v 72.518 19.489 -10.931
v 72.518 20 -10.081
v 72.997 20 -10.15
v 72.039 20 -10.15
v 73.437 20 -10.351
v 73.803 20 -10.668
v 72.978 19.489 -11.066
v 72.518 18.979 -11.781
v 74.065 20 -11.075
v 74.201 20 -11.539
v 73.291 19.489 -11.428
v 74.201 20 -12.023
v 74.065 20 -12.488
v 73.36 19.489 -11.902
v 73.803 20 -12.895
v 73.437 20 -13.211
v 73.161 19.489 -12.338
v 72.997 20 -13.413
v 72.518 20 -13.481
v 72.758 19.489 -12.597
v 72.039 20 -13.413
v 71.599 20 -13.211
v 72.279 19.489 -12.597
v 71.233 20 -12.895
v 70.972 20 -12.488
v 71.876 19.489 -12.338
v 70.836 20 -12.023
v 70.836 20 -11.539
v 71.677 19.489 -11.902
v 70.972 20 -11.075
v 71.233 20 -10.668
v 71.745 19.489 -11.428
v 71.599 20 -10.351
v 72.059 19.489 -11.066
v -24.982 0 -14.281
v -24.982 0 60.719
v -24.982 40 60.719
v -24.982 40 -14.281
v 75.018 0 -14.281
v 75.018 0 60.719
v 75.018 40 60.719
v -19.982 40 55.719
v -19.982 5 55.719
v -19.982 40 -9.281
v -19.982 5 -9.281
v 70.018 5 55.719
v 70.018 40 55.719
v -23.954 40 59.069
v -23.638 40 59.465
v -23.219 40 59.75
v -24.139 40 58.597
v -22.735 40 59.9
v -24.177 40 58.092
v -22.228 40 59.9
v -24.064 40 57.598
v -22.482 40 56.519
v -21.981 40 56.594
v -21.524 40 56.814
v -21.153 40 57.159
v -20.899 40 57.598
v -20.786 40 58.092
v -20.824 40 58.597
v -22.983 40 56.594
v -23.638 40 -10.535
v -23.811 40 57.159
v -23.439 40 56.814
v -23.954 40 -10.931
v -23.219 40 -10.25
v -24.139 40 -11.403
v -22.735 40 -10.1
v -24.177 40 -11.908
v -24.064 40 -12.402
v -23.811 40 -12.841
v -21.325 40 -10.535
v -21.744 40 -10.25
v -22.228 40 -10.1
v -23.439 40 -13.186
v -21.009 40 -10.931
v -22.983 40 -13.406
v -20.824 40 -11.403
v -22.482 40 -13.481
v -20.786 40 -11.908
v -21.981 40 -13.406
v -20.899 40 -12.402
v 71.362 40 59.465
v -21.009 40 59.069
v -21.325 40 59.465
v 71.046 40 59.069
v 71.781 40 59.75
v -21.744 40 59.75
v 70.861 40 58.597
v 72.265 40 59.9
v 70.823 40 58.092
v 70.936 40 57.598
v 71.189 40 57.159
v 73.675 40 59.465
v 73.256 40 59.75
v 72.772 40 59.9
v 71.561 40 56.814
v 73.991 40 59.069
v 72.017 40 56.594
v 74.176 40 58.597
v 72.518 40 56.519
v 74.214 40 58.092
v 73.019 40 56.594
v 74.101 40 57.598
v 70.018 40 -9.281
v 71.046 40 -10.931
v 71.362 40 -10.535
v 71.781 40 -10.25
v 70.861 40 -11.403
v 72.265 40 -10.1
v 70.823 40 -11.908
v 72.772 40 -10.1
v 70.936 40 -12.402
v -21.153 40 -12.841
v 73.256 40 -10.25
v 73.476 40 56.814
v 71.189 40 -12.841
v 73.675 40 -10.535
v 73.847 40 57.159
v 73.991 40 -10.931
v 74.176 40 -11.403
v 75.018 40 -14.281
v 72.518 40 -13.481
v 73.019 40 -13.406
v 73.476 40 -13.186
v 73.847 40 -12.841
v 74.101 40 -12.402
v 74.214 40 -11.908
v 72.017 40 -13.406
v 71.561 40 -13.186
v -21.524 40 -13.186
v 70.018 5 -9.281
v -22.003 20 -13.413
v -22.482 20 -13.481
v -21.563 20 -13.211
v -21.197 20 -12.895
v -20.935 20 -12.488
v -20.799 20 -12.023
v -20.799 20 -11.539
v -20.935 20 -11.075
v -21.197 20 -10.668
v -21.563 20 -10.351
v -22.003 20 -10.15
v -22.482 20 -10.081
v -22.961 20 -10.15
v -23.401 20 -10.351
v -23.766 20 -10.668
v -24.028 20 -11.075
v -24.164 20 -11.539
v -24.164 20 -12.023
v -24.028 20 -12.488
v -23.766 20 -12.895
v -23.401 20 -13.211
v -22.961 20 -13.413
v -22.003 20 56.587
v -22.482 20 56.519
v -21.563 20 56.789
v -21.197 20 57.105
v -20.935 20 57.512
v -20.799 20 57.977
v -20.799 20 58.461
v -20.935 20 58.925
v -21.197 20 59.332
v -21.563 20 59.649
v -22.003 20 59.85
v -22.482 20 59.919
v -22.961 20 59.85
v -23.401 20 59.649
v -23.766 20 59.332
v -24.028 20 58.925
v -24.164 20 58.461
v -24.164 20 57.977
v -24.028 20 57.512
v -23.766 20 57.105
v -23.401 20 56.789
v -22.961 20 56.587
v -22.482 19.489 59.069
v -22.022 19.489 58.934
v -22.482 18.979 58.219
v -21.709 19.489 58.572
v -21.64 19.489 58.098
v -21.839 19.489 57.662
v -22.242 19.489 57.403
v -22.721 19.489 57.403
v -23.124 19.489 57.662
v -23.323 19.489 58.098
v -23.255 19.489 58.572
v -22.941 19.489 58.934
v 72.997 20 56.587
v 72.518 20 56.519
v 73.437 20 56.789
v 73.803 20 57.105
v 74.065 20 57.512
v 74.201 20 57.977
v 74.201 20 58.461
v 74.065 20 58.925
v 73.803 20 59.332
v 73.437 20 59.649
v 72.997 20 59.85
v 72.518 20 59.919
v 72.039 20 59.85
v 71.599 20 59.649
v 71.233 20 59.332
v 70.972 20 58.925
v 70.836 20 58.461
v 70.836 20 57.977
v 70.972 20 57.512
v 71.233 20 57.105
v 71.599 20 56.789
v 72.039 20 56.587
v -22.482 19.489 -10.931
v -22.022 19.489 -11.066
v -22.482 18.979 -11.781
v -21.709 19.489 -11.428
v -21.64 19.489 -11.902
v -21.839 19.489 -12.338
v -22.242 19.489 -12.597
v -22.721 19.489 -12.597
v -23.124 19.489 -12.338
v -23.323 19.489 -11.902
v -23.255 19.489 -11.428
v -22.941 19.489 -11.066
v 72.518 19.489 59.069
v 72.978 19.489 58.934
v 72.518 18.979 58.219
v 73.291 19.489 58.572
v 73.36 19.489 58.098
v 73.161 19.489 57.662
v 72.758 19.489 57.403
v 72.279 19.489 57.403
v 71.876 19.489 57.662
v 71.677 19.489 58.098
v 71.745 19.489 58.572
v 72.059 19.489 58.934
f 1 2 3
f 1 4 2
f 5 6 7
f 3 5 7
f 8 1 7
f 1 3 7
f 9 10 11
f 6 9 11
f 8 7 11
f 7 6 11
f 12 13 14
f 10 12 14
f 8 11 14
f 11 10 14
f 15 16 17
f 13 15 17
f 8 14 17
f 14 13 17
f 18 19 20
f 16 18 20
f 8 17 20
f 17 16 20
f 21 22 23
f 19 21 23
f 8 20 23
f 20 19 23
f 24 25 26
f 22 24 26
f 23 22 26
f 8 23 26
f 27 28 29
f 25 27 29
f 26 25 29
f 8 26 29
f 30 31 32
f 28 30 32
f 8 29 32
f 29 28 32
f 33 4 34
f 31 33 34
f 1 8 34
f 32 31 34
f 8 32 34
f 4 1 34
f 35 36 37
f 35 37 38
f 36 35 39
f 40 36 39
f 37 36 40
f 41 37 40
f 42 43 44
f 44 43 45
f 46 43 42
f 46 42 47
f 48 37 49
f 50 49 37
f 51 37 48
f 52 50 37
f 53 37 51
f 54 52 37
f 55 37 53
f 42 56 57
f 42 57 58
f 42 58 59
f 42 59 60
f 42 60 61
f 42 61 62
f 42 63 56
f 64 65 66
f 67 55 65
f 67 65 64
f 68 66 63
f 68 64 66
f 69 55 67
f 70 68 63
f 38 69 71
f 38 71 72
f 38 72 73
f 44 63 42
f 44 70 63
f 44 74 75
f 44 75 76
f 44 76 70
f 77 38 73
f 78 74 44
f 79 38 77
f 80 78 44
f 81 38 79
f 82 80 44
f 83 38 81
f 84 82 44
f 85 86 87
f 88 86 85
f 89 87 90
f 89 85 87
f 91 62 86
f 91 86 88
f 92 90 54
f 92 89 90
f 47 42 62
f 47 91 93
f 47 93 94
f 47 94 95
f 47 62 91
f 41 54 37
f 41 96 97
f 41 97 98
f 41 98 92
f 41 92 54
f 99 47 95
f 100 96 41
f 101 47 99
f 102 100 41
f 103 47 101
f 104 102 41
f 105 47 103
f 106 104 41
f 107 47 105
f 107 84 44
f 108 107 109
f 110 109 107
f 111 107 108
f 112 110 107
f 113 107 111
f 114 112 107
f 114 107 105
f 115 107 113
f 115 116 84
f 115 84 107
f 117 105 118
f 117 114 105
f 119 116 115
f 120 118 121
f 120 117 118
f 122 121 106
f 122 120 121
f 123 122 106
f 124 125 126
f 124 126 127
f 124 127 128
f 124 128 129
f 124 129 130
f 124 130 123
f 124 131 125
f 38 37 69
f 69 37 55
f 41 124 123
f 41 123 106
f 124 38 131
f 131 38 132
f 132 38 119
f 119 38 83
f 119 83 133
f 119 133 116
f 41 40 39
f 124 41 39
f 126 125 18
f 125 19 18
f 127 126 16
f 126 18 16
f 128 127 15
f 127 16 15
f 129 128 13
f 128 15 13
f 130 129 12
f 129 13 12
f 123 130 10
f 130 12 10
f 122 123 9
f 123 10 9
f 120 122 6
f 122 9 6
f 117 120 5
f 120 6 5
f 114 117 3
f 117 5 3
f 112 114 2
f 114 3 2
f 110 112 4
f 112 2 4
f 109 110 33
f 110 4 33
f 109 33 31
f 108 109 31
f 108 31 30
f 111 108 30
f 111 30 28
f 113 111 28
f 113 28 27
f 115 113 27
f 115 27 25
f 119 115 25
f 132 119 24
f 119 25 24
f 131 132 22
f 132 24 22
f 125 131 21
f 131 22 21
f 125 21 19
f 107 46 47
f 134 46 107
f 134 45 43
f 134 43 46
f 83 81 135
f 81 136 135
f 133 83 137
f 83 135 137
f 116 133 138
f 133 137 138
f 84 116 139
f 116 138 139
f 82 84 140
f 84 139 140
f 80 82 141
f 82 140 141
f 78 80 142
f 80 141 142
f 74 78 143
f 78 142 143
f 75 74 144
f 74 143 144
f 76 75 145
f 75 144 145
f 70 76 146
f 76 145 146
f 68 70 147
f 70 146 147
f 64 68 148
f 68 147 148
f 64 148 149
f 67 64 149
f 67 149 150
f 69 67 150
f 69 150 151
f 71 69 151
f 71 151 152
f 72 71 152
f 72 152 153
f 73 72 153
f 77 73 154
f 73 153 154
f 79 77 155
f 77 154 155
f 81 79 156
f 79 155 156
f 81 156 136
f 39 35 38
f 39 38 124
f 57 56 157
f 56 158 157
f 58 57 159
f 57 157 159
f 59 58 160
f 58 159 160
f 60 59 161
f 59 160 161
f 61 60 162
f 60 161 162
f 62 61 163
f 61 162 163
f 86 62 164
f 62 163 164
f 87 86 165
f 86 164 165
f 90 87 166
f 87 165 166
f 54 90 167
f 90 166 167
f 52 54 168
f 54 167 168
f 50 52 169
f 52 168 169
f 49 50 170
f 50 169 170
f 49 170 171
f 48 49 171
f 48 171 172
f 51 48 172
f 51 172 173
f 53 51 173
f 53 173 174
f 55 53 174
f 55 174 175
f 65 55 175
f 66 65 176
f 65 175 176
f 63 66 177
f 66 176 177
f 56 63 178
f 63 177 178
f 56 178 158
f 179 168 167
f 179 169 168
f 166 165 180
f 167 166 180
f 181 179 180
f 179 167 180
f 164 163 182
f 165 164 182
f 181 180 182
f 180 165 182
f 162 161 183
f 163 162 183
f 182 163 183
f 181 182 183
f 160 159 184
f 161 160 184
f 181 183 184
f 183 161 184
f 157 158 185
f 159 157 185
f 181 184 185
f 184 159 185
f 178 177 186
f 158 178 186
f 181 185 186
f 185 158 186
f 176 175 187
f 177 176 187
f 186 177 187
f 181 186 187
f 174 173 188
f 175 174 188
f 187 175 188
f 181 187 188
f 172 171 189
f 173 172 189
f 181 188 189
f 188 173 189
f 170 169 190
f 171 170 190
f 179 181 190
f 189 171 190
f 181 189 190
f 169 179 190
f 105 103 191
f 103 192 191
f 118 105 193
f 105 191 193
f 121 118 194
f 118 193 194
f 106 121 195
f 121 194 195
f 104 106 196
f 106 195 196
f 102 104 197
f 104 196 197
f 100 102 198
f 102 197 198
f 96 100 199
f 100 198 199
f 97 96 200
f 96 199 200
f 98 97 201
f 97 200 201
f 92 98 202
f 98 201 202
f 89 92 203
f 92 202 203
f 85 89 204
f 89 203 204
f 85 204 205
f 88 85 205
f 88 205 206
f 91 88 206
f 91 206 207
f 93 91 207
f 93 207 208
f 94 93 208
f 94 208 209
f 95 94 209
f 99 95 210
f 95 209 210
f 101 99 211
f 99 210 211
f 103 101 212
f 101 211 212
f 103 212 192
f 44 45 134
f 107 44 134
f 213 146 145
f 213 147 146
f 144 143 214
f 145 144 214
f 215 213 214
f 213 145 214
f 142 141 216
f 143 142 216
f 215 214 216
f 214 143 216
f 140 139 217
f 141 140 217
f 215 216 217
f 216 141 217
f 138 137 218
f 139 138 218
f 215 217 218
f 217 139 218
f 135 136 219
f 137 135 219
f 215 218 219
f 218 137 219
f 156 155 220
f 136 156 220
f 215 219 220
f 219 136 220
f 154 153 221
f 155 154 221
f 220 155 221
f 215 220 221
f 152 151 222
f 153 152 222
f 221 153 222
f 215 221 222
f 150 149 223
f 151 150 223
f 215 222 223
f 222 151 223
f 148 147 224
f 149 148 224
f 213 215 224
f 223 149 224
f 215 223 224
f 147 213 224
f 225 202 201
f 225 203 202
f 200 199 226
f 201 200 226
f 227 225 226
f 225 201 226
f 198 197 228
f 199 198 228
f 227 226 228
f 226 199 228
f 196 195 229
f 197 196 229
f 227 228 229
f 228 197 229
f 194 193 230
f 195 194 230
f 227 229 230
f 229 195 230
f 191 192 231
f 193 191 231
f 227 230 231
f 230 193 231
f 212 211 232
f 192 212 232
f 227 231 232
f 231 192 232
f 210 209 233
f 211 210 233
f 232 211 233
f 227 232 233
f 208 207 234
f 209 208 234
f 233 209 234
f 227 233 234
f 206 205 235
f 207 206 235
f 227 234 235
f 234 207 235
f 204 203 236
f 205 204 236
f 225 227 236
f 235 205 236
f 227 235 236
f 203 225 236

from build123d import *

# Parameters (mm, degrees)
CROQUIS1_W                       = 100
CROQUIS1_H                       = 75
SALIENTE_EXTRUIR1_DEPTH          = 40
CROQUIS2_W                       = 90
CROQUIS2_H                       = 65
CORTAR_EXTRUIR1_DEPTH            = 105.472453923
CROQUIS3_W                       = 90
CROQUIS3_H                       = 65
SALIENTE_EXTRUIR2_DEPTH          = 5
TALADRO_DE_MARGEN_PARA_M31_D     = 3.4
TALADRO_DE_MARGEN_PARA_M31_DEPTH = 20
TALADRO_DE_MARGEN_PARA_M31_TIP   = 1.021463052


with BuildPart() as part:
    # Croquis1 → Saliente-Extruir1 (new body)
    with BuildSketch(Plane(origin=(0, 0, 0), x_dir=(1, 0, 0), z_dir=(0, 1, 0))):
        with Locations((25.018270402, -23.21863581)):
            Rectangle(CROQUIS1_W, CROQUIS1_H)
    extrude(amount=SALIENTE_EXTRUIR1_DEPTH)

    # Croquis2 → Cortar-Extruir1 (cut, through all)
    with BuildSketch(Plane(origin=(0, 0, 0), x_dir=(1, 0, 0), z_dir=(0, 1, 0))):
        with Locations((25.018270402, -23.21863581)):
            Rectangle(CROQUIS2_W, CROQUIS2_H)
    extrude(amount=CORTAR_EXTRUIR1_DEPTH, mode=Mode.SUBTRACT)

    # Croquis3 → Saliente-Extruir2 (add)
    with BuildSketch(Plane(origin=(0, 0, 0), x_dir=(1, 0, 0), z_dir=(0, 1, 0))):
        with Locations((25.018270402, -23.21863581)):
            Rectangle(CROQUIS3_W, CROQUIS3_H)
    extrude(amount=SALIENTE_EXTRUIR2_DEPTH)

    # Taladro de margen para M31
    with Locations(Plane(origin=(-22.481719301, 40, -11.781363893), x_dir=(0, 0, 1), z_dir=(0, 1, 0))):
        with Locations((0, 0), (-2.33e-07, 94.999989703), (69.999999703, 94.999989703), (69.999999703, 1.038e-06)):
            Hole(TALADRO_DE_MARGEN_PARA_M31_D / 2, depth=TALADRO_DE_MARGEN_PARA_M31_DEPTH)
            with Locations((0, 0, -(TALADRO_DE_MARGEN_PARA_M31_DEPTH + TALADRO_DE_MARGEN_PARA_M31_TIP / 2))):  # 118° drill point
                Cone(0, TALADRO_DE_MARGEN_PARA_M31_D / 2, TALADRO_DE_MARGEN_PARA_M31_TIP, mode=Mode.SUBTRACT)


solid = part.part
